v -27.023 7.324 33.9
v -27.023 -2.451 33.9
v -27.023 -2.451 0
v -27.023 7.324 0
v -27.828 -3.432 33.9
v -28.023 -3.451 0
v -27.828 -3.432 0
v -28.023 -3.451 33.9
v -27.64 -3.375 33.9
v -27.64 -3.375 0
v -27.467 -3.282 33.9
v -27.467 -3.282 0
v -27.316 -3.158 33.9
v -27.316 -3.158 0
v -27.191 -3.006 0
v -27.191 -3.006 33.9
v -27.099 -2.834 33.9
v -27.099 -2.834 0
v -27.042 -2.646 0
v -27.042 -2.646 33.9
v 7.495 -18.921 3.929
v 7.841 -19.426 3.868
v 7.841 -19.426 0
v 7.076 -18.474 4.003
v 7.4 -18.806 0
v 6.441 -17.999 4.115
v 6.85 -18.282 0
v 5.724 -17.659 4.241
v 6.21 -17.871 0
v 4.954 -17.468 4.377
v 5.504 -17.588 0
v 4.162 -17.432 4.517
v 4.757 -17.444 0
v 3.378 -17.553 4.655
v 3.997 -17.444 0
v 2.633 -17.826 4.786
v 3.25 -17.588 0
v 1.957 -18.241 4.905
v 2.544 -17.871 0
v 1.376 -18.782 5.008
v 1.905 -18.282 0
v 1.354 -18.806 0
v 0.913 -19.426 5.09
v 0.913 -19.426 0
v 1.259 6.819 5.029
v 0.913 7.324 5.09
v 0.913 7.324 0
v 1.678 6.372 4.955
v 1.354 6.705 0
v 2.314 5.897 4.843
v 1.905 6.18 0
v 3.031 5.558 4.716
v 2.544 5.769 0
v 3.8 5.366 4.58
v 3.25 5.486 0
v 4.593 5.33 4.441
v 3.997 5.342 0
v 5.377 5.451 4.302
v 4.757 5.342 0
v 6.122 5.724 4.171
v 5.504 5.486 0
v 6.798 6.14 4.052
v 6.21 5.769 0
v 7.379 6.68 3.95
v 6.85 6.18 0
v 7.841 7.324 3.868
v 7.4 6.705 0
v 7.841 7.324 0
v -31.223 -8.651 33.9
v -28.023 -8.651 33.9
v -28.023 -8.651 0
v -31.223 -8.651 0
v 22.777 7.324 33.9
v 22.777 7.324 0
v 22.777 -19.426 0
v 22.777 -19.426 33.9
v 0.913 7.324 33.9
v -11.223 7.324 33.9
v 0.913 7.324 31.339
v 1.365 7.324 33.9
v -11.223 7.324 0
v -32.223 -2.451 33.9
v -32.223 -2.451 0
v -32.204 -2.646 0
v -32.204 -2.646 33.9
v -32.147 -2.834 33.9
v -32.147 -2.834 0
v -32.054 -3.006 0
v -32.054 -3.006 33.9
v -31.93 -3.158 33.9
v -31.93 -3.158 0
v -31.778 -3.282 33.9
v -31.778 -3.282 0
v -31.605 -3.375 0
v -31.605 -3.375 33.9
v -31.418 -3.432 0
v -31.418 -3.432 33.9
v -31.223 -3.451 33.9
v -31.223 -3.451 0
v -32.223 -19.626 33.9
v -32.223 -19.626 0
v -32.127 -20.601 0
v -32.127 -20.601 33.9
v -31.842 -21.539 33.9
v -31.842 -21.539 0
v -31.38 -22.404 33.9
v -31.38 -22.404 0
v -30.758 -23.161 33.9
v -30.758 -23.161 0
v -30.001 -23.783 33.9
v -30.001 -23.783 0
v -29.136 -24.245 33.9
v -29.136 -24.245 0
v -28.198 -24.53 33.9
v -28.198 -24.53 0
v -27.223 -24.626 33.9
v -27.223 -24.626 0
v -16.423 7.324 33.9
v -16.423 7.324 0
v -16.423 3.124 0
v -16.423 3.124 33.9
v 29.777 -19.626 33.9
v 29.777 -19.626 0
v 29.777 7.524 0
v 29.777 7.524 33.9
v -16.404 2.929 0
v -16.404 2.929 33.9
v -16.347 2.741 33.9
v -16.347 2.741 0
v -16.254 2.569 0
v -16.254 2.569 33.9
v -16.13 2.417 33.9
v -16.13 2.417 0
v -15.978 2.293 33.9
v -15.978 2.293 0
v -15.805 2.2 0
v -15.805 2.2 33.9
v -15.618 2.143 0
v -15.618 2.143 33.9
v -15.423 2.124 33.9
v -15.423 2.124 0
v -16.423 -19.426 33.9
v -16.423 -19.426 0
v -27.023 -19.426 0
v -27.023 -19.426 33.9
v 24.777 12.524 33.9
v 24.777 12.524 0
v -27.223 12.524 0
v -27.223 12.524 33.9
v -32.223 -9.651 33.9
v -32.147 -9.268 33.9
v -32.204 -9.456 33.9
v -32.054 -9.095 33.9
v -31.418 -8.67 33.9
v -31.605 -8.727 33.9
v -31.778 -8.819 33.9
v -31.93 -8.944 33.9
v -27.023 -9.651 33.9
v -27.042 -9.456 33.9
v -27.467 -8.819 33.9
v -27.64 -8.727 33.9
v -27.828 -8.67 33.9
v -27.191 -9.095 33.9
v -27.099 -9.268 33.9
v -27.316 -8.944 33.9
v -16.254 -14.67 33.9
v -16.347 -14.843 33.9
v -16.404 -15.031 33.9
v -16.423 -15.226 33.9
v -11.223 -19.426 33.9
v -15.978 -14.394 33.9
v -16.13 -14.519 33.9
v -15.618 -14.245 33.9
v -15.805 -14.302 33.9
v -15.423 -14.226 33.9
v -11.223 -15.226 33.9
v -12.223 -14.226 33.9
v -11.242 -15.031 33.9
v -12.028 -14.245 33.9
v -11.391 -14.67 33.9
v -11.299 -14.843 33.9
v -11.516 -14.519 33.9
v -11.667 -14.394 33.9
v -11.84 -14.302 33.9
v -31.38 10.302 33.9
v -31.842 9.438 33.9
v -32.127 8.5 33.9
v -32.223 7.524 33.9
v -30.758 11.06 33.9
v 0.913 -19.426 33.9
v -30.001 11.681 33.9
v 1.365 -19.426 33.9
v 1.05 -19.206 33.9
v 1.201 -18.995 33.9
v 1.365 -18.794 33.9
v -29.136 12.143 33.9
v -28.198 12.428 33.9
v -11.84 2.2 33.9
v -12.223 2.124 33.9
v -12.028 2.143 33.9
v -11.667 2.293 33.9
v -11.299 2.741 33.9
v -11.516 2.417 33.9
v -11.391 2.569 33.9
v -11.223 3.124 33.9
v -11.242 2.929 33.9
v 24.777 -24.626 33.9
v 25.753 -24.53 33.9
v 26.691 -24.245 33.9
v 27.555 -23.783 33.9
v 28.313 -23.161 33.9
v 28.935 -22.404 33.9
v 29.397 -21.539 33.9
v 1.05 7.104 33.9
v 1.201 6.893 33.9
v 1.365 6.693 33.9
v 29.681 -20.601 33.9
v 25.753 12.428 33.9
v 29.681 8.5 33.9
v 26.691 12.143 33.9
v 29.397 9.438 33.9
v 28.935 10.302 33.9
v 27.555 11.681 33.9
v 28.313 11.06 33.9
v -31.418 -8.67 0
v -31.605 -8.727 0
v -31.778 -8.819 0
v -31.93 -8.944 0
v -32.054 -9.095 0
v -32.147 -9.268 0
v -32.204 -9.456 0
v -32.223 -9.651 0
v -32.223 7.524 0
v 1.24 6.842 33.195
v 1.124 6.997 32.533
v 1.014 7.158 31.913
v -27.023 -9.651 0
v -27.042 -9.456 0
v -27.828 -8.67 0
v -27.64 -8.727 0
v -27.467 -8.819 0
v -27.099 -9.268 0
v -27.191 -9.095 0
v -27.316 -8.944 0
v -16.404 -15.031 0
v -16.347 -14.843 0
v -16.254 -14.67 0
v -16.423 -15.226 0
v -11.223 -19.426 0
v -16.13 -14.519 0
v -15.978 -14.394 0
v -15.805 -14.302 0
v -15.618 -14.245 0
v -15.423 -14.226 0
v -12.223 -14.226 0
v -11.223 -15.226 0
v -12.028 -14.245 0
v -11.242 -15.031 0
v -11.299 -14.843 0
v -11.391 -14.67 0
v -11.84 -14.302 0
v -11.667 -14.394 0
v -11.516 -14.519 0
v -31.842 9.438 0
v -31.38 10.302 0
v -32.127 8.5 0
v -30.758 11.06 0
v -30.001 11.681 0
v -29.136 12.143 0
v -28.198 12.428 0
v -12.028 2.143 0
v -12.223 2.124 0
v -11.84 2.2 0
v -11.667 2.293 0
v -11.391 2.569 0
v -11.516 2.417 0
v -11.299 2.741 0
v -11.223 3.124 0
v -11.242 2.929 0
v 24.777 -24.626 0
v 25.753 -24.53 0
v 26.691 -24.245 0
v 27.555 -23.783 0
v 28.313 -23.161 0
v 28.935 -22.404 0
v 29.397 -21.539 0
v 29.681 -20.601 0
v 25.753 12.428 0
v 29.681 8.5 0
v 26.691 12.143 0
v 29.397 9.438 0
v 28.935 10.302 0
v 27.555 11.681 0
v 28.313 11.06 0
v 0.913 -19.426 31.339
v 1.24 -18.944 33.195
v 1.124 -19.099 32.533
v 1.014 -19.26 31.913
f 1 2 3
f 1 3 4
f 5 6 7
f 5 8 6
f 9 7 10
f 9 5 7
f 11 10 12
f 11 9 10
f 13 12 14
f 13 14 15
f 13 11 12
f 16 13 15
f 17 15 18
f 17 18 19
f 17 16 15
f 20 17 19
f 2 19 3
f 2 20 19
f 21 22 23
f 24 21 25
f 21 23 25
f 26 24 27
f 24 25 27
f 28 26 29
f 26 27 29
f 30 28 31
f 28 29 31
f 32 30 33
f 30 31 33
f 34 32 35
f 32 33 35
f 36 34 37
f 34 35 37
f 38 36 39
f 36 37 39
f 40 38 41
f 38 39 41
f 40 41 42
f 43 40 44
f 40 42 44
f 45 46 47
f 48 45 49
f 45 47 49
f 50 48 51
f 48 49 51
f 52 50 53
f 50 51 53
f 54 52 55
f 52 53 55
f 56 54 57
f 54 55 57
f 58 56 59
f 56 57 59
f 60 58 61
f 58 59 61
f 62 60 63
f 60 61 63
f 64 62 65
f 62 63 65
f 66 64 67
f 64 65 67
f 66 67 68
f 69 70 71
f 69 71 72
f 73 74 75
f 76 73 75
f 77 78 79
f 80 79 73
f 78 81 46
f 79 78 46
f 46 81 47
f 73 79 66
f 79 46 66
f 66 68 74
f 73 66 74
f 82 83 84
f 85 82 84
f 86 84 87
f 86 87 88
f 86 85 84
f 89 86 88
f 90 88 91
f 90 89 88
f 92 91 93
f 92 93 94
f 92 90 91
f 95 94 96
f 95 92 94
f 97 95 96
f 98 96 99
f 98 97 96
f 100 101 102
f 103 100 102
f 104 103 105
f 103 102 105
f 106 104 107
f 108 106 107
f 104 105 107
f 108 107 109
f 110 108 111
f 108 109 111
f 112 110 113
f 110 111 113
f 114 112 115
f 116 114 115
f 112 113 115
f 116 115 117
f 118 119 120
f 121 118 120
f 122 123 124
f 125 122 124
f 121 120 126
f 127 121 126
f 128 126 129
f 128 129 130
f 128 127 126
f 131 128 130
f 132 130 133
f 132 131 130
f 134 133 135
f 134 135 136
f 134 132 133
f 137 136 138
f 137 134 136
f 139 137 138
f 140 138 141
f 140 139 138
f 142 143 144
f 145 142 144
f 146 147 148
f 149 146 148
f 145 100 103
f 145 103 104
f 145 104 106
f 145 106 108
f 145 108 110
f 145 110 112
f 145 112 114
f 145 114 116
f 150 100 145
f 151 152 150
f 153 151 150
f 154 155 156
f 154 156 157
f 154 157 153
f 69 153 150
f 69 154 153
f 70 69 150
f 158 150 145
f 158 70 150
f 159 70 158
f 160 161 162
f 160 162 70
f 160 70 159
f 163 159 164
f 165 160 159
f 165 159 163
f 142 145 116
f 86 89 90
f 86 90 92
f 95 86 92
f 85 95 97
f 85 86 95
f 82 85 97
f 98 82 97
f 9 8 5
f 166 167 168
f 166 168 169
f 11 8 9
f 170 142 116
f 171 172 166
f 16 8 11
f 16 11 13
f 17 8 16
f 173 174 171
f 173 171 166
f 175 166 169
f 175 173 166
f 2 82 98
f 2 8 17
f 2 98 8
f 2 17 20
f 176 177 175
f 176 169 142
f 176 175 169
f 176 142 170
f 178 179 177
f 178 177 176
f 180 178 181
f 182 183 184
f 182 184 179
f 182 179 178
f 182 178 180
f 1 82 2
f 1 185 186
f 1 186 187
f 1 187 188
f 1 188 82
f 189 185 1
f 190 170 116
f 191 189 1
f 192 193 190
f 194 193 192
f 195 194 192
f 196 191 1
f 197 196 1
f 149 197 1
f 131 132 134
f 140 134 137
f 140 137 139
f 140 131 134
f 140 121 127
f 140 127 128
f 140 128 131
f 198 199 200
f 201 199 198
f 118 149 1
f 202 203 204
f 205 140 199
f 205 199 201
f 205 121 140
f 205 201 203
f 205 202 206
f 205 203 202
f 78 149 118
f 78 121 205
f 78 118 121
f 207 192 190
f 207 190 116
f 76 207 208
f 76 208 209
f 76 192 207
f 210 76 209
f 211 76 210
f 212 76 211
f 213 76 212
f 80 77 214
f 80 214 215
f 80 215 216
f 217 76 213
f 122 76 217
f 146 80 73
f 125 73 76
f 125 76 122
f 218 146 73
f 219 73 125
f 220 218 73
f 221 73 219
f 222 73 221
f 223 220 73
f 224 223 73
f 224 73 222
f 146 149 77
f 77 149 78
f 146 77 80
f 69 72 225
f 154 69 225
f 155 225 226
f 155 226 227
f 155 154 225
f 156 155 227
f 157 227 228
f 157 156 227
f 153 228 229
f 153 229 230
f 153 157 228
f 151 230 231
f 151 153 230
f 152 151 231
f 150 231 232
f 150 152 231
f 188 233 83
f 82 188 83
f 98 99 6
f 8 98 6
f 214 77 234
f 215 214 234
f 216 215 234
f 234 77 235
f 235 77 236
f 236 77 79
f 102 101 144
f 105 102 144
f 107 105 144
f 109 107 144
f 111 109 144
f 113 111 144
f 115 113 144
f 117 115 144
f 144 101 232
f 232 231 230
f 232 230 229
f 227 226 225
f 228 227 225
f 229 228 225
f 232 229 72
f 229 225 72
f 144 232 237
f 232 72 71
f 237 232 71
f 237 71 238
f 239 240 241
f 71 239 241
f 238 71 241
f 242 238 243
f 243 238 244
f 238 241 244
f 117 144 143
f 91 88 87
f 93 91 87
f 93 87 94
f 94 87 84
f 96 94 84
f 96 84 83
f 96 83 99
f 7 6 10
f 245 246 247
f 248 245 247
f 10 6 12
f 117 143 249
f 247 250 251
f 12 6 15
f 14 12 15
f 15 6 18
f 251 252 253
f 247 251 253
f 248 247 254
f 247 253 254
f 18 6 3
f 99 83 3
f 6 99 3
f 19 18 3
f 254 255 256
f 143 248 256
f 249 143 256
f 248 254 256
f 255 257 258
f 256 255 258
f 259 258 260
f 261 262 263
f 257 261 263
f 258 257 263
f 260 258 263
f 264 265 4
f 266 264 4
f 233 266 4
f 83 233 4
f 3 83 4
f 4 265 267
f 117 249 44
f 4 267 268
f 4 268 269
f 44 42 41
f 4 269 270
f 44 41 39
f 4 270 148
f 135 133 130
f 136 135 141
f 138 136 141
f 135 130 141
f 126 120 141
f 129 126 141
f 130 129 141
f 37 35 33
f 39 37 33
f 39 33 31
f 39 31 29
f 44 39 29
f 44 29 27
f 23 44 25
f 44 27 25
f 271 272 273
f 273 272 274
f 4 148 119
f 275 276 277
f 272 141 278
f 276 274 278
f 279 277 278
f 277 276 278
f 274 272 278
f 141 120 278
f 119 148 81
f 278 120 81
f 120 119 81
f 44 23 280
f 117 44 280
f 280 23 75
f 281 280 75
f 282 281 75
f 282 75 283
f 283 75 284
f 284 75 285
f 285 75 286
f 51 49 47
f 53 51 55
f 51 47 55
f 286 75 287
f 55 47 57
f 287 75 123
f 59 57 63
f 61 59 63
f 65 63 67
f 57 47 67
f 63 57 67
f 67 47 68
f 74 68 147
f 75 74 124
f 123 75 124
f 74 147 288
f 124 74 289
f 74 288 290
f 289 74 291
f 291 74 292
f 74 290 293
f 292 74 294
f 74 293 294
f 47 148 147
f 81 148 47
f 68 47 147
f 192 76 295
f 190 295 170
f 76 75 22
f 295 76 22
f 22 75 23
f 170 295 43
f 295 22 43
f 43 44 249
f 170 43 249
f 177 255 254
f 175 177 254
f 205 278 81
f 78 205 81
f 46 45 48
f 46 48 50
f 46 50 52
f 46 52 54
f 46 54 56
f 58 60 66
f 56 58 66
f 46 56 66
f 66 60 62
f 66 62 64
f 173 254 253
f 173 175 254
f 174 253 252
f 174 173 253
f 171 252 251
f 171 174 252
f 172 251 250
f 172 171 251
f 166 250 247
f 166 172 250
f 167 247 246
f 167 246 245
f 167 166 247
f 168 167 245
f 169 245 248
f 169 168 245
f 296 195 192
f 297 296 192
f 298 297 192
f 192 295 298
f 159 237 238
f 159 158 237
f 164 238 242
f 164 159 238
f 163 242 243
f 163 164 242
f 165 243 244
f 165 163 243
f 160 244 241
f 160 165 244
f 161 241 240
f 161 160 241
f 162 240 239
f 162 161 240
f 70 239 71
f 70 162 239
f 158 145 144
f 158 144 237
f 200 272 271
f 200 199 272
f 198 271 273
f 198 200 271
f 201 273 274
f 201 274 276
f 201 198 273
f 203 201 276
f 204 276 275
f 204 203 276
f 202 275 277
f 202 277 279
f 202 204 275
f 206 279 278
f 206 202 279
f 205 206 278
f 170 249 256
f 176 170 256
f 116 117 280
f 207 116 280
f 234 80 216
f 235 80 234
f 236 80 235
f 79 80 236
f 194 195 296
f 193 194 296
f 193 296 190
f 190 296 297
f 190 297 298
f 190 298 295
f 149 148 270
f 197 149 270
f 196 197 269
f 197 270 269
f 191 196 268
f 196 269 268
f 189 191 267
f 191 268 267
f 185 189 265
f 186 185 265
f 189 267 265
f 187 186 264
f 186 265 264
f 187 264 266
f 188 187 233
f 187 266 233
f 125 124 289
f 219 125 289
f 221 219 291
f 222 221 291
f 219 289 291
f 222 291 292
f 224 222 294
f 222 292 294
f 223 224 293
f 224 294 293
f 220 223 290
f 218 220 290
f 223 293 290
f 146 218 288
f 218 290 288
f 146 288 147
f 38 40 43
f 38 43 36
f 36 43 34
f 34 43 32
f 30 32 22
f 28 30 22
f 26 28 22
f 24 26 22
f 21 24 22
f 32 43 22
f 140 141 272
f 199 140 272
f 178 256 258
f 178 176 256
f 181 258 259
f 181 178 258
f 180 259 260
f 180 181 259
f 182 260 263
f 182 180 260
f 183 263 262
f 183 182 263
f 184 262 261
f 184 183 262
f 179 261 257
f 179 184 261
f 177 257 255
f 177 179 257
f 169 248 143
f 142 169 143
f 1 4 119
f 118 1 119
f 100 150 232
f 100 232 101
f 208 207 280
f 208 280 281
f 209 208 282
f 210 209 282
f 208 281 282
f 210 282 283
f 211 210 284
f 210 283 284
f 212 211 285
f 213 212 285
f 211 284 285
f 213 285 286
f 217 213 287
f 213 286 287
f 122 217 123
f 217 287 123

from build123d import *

# Parameters (mm, degrees)
F1_DEPTH = 33.9
F2_R     = 1
F4_W     = 15.65184
F4_H     = 26.75
F5_DEPTH = 33.1


with BuildPart() as f1:
    # F0 (on Top) → F1 (new body)
    with BuildSketch(Plane.XY):
        with BuildLine():
            Line((7.841366, 7.324094), (22.777264, 7.324094))
            Line((22.777264, 7.324094), (22.777264, -19.425906))
            Line((22.777264, -19.425906), (7.841366, -19.425906))
            ThreePointArc((7.841366, -19.425906), (4.377264, -17.425906), (0.913162, -19.425906))
            Line((0.913162, -19.425906), (-11.222736, -19.425906))
            Line((-11.222736, -19.425906), (-11.222736, -14.225906))
            Line((-11.222736, -14.225906), (-16.422736, -14.225906))
            Line((-16.422736, -14.225906), (-16.422736, -19.425906))
            Line((-16.422736, -19.425906), (-27.022736, -19.425906))
            Line((-27.022736, -19.425906), (-27.022736, -8.650906))
            Line((-27.022736, -8.650906), (-32.222736, -8.650906))
            Line((-32.222736, -8.650906), (-32.222736, -19.625906))
            ThreePointArc((-32.222736, -19.625906), (-30.75827, -23.16144), (-27.222736, -24.625906))
            Line((-27.222736, -24.625906), (24.777264, -24.625906))
            ThreePointArc((24.777264, -24.625906), (28.312798, -23.16144), (29.777264, -19.625906))
            Line((29.777264, -19.625906), (29.777264, 7.524094))
            ThreePointArc((29.777264, 7.524094), (28.312798, 11.059628), (24.777264, 12.524094))
            Line((24.777264, 12.524094), (-27.222736, 12.524094))
            ThreePointArc((-27.222736, 12.524094), (-30.75827, 11.059628), (-32.222736, 7.524094))
            Line((-32.222736, 7.524094), (-32.222736, -3.450906))
            Line((-32.222736, -3.450906), (-27.022736, -3.450906))
            Line((-27.022736, -3.450906), (-27.022736, 7.324094))
            Line((-27.022736, 7.324094), (-16.422736, 7.324094))
            Line((-16.422736, 7.324094), (-16.422736, 2.124094))
            Line((-16.422736, 2.124094), (-11.222736, 2.124094))
            Line((-11.222736, 2.124094), (-11.222736, 7.324094))
            Line((-11.222736, 7.324094), (0.913162, 7.324094))
            ThreePointArc((0.913162, 7.324094), (4.377264, 5.324094), (7.841366, 7.324094))
        make_face()
    extrude(amount=F1_DEPTH)

    # F2
    f2_edges = [f1.edges().sort_by_distance(p)[0] for p in [
        (-16.422736, -14.225906, 16.95),
        (-11.222736, -14.225906, 16.95),
        (-11.222736, 2.124094, 16.95),
        (-16.422736, 2.124094, 16.95),
        (-27.022736, -8.650906, 16.95),
        (-32.222736, -8.650906, 16.95),
        (-27.022736, -3.450906, 16.95),
        (-32.222736, -3.450906, 16.95),
    ]]
    fillet(f2_edges, radius=F2_R)

    # F4 (on face) → F5 (cut)
    with BuildSketch(Plane(origin=(0.897894, 0, 5.092212), x_dir=(0.984808, 0, -0.173648), z_dir=(-0.173648, 0, -0.984808))):
        with Locations((3.283218, 6.050906)):
            Rectangle(F4_W, F4_H)
    extrude(amount=-F5_DEPTH, mode=Mode.SUBTRACT)


solid = f1.part
